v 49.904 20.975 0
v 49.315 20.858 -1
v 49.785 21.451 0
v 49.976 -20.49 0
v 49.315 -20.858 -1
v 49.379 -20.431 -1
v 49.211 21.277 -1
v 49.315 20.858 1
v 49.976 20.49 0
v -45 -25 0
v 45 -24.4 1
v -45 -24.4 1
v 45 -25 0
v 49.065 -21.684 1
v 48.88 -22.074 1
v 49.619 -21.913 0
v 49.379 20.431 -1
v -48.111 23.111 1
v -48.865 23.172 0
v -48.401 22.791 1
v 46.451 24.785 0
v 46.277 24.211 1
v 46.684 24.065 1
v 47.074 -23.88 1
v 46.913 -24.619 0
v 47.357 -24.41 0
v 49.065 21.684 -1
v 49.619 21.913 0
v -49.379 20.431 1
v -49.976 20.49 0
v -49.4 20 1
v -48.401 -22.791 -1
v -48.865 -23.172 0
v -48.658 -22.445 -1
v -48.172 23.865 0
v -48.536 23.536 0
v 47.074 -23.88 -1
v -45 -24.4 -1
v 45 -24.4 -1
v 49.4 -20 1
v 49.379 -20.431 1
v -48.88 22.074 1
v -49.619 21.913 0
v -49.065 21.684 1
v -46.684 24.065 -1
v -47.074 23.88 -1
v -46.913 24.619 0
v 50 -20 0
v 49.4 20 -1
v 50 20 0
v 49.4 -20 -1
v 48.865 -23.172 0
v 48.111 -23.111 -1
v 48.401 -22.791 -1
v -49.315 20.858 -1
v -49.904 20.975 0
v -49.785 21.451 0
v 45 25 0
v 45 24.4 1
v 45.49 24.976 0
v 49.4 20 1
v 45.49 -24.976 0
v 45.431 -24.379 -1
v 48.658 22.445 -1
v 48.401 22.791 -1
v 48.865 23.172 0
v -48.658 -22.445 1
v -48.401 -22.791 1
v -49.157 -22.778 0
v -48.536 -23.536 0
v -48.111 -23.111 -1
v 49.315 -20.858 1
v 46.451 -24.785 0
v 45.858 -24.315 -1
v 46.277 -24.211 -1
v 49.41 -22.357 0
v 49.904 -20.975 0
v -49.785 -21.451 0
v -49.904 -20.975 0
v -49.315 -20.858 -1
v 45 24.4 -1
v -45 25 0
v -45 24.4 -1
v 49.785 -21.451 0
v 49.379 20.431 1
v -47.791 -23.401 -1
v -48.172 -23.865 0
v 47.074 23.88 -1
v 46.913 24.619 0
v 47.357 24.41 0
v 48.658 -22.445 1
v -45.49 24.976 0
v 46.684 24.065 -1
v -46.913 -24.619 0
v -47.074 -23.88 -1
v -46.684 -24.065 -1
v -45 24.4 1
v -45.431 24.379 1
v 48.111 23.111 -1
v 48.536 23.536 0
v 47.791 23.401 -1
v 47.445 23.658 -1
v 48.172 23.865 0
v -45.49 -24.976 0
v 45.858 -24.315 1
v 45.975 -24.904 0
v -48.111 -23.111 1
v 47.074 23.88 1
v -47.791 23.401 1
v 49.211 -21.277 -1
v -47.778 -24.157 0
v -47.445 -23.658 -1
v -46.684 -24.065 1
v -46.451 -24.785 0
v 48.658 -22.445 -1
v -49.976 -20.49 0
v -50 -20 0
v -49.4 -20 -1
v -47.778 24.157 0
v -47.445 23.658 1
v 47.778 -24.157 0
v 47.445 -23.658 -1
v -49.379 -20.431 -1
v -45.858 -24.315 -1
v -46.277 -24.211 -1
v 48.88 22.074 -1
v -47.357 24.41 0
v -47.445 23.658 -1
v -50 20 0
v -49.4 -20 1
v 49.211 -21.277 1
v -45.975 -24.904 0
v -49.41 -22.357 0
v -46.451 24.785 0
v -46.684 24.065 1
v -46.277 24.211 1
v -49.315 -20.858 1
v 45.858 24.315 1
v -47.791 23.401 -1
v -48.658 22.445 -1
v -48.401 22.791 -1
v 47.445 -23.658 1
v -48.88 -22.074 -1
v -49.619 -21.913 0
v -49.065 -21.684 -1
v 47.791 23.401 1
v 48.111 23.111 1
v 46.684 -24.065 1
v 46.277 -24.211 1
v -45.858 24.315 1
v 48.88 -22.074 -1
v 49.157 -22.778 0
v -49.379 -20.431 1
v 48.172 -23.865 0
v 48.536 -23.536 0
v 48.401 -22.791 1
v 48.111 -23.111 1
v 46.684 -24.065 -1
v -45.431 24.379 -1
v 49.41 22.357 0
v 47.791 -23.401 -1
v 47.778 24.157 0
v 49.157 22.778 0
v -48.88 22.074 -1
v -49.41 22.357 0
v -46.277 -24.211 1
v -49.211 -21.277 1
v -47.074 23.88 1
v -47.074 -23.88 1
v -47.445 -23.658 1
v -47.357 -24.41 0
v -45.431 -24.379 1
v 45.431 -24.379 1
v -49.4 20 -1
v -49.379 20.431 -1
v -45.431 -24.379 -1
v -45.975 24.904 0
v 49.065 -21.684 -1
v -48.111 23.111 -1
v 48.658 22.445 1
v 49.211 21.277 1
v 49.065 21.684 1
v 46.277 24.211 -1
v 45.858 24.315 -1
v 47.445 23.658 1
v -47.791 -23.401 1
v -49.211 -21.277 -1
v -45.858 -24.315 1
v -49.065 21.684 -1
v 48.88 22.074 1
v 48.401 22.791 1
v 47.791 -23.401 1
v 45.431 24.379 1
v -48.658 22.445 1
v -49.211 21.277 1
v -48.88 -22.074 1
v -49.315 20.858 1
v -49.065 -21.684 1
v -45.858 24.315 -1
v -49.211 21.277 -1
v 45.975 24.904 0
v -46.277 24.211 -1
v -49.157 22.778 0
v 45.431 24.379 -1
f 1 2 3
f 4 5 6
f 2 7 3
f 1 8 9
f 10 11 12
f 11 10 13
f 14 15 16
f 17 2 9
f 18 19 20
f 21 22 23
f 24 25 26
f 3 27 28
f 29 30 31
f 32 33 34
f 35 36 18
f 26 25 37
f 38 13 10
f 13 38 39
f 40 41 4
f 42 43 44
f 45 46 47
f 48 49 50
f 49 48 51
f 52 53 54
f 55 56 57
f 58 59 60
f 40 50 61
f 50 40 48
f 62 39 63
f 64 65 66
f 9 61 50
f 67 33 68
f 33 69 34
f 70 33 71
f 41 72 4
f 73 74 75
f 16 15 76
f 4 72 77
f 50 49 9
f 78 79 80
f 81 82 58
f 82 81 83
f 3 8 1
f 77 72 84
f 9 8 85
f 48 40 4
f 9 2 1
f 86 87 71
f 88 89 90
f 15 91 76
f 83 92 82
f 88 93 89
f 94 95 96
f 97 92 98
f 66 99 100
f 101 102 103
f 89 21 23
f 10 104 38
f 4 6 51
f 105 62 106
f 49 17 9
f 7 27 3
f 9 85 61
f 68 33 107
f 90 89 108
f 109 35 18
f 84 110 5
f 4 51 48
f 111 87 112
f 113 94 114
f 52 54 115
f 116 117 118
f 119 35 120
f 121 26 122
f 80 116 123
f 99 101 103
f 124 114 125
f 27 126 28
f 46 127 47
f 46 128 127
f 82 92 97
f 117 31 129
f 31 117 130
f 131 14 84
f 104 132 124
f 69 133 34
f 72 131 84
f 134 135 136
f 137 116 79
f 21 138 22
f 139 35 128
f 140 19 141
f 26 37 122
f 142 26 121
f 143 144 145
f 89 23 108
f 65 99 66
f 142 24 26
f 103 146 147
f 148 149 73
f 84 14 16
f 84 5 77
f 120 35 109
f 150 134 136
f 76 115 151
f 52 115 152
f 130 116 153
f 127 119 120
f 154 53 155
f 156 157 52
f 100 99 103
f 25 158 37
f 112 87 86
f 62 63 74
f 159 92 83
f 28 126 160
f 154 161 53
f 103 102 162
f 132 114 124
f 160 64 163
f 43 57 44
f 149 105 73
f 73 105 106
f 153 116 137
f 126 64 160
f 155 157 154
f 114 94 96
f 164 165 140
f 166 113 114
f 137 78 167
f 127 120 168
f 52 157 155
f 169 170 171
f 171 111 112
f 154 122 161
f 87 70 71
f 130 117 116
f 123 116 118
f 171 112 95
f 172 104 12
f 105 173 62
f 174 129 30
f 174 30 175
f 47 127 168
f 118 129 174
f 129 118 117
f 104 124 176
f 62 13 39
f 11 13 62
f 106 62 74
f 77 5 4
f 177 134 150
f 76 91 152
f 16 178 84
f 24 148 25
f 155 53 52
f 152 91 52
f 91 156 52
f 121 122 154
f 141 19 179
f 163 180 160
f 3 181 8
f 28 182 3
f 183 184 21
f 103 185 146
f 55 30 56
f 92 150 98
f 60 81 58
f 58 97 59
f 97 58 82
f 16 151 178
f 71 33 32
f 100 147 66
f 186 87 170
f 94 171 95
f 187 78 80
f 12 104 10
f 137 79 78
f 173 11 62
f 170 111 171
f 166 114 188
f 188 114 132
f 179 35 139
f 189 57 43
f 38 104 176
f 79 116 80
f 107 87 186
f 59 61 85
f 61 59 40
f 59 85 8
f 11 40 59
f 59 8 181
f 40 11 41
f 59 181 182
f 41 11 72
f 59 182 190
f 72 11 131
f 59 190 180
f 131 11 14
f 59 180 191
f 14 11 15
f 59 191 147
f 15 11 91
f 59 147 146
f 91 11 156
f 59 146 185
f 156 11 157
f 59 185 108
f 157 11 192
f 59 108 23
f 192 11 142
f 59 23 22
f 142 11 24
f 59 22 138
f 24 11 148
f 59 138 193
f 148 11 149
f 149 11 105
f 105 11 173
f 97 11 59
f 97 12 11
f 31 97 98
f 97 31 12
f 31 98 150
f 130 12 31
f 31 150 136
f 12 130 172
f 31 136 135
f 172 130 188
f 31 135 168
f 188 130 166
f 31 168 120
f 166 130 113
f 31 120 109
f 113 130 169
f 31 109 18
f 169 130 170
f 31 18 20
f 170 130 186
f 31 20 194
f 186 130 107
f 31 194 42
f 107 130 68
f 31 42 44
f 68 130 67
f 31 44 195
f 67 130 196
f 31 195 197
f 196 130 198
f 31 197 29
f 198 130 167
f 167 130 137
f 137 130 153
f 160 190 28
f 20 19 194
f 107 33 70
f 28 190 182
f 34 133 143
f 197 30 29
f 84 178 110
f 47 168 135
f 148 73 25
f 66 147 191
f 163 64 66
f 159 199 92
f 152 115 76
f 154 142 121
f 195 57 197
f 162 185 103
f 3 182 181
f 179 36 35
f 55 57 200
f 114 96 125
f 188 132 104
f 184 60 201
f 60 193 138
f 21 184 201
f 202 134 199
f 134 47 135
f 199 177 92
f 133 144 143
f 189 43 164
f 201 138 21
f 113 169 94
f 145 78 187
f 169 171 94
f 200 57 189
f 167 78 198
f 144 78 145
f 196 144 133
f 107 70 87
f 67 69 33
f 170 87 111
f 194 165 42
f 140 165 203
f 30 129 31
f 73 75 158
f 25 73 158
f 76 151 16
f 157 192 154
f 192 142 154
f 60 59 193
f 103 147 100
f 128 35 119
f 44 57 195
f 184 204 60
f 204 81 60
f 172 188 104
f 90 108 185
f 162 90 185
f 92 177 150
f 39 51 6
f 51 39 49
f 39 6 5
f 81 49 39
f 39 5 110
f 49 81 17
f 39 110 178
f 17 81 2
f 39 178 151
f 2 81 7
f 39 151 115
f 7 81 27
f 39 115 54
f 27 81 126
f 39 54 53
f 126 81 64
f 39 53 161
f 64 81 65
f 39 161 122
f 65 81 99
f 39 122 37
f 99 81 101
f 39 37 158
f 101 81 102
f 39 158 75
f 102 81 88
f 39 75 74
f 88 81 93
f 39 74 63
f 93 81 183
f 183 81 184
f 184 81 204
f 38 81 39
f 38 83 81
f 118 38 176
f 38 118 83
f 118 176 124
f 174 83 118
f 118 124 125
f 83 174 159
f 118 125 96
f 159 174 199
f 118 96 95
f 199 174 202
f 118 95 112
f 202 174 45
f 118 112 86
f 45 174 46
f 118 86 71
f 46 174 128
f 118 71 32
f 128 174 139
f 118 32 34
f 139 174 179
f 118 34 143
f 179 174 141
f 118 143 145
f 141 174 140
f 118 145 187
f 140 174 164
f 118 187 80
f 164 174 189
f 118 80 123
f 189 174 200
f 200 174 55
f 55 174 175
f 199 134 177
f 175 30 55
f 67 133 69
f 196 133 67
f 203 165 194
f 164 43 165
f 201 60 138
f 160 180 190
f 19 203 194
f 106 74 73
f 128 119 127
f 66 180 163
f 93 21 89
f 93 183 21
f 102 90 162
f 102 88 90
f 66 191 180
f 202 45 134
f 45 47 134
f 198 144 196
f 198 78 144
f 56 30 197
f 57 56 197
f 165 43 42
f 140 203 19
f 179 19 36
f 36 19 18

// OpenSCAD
// Sheet: carbon fiber (single connected solid with subtle woven relief)
// Parameters
length = 100;          // X
width  = 50;           // Y
thickness = 2;         // Z
corner_radius = 5;     // rounded corners
edge_chamfer = 0.6;    // small bevel on top/bottom edges

// Weave relief (very shallow so it still reads as a sheet)
weave_pitch = 4;       // spacing between weave ridges
weave_amp   = 0.12;    // height of weave ridges (keep small)
weave_w     = 0.7;     // ridge width

$fn = 64;

// 2D rounded rectangle
module rounded_rect_2d(L, W, R) {
    // robust rounded rectangle using minkowski
    minkowski() {
        square([L - 2*R, W - 2*R], center=true);
        circle(r=R);
    }
}

// 3D sheet with chamfered edges (via hull between two rounded rectangles)
module chamfered_sheet(L, W, T, R, C) {
    // Clamp chamfer so geometry stays valid
    c = min(C, T/2 - 0.001, R - 0.001);

    hull() {
        // bottom face (slightly inset)
        translate([0, 0, -T/2])
            linear_extrude(height=0.001)
                rounded_rect_2d(L - 2*c, W - 2*c, R - c);

        // top face (slightly inset)
        translate([0, 0,  T/2 - 0.001])
            linear_extrude(height=0.001)
                rounded_rect_2d(L - 2*c, W - 2*c, R - c);

        // mid body (full size)
        translate([0, 0, -0.0005])
            linear_extrude(height=0.001)
                rounded_rect_2d(L, W, R);
    }
}

// Subtle woven relief on top surface (kept inside perimeter)
module weave_relief(L, W, T, R, pitch, amp, ridge_w) {
    inset = max(R + 1, pitch); // keep ridges away from rounded corners/edges
    x0 = -L/2 + inset;
    x1 =  L/2 - inset;
    y0 = -W/2 + inset;
    y1 =  W/2 - inset;

    // Place ridges so they are guaranteed to intersect the sheet (connected solid)
    z_base = T/2 - amp; // ridges sit on top surface with full contact

    union() {
        // 0° ridges
        for (y = [y0 : pitch : y1]) {
            translate([0, y, z_base])
                cube([ (x1 - x0), ridge_w, amp ], center=true);
        }

        // 90° ridges
        for (x = [x0 : pitch : x1]) {
            translate([x, 0, z_base])
                cube([ ridge_w, (y1 - y0), amp ], center=true);
        }

        // Clip relief to the sheet outline so nothing protrudes outside
        intersection() {
            // relief union above
            children();
            // clipping volume: slightly smaller than sheet top area
            translate([0, 0, T/2 - amp/2])
                linear_extrude(height=amp + 0.001, center=true)
                    rounded_rect_2d(L - 2*inset, W - 2*inset, max(0.01, R - inset));
        }
    }
}

// Assemble: one connected solid
union() {
    chamfered_sheet(length, width, thickness, corner_radius, edge_chamfer);

    // Add subtle weave as real geometry (still one solid)
    weave_relief(length, width, thickness, corner_radius, weave_pitch, weave_amp, weave_w)
        union() {
            // pass-through placeholder for intersection() children()
            // (actual ridges are created inside weave_relief via children())
        };
}

// Rebuild weave_relief with proper children content (OpenSCAD needs explicit children usage)
module weave_relief(L, W, T, R, pitch, amp, ridge_w) {
    inset = max(R + 1, pitch);
    x0 = -L/2 + inset;
    x1 =  L/2 - inset;
    y0 = -W/2 + inset;
    y1 =  W/2 - inset;

    z_base = T/2 - amp;

    intersection() {
        union() {
            for (y = [y0 : pitch : y1])
                translate([0, y, z_base])
                    cube([ (x1 - x0), ridge_w, amp ], center=true);

            for (x = [x0 : pitch : x1])
                translate([x, 0, z_base])
                    cube([ ridge_w, (y1 - y0), amp ], center=true);
        }

        translate([0, 0, T/2 - amp/2])
            linear_extrude(height=amp + 0.01, center=true)
                rounded_rect_2d(L - 2*inset, W - 2*inset, max(0.01, R - inset));
    }
}
